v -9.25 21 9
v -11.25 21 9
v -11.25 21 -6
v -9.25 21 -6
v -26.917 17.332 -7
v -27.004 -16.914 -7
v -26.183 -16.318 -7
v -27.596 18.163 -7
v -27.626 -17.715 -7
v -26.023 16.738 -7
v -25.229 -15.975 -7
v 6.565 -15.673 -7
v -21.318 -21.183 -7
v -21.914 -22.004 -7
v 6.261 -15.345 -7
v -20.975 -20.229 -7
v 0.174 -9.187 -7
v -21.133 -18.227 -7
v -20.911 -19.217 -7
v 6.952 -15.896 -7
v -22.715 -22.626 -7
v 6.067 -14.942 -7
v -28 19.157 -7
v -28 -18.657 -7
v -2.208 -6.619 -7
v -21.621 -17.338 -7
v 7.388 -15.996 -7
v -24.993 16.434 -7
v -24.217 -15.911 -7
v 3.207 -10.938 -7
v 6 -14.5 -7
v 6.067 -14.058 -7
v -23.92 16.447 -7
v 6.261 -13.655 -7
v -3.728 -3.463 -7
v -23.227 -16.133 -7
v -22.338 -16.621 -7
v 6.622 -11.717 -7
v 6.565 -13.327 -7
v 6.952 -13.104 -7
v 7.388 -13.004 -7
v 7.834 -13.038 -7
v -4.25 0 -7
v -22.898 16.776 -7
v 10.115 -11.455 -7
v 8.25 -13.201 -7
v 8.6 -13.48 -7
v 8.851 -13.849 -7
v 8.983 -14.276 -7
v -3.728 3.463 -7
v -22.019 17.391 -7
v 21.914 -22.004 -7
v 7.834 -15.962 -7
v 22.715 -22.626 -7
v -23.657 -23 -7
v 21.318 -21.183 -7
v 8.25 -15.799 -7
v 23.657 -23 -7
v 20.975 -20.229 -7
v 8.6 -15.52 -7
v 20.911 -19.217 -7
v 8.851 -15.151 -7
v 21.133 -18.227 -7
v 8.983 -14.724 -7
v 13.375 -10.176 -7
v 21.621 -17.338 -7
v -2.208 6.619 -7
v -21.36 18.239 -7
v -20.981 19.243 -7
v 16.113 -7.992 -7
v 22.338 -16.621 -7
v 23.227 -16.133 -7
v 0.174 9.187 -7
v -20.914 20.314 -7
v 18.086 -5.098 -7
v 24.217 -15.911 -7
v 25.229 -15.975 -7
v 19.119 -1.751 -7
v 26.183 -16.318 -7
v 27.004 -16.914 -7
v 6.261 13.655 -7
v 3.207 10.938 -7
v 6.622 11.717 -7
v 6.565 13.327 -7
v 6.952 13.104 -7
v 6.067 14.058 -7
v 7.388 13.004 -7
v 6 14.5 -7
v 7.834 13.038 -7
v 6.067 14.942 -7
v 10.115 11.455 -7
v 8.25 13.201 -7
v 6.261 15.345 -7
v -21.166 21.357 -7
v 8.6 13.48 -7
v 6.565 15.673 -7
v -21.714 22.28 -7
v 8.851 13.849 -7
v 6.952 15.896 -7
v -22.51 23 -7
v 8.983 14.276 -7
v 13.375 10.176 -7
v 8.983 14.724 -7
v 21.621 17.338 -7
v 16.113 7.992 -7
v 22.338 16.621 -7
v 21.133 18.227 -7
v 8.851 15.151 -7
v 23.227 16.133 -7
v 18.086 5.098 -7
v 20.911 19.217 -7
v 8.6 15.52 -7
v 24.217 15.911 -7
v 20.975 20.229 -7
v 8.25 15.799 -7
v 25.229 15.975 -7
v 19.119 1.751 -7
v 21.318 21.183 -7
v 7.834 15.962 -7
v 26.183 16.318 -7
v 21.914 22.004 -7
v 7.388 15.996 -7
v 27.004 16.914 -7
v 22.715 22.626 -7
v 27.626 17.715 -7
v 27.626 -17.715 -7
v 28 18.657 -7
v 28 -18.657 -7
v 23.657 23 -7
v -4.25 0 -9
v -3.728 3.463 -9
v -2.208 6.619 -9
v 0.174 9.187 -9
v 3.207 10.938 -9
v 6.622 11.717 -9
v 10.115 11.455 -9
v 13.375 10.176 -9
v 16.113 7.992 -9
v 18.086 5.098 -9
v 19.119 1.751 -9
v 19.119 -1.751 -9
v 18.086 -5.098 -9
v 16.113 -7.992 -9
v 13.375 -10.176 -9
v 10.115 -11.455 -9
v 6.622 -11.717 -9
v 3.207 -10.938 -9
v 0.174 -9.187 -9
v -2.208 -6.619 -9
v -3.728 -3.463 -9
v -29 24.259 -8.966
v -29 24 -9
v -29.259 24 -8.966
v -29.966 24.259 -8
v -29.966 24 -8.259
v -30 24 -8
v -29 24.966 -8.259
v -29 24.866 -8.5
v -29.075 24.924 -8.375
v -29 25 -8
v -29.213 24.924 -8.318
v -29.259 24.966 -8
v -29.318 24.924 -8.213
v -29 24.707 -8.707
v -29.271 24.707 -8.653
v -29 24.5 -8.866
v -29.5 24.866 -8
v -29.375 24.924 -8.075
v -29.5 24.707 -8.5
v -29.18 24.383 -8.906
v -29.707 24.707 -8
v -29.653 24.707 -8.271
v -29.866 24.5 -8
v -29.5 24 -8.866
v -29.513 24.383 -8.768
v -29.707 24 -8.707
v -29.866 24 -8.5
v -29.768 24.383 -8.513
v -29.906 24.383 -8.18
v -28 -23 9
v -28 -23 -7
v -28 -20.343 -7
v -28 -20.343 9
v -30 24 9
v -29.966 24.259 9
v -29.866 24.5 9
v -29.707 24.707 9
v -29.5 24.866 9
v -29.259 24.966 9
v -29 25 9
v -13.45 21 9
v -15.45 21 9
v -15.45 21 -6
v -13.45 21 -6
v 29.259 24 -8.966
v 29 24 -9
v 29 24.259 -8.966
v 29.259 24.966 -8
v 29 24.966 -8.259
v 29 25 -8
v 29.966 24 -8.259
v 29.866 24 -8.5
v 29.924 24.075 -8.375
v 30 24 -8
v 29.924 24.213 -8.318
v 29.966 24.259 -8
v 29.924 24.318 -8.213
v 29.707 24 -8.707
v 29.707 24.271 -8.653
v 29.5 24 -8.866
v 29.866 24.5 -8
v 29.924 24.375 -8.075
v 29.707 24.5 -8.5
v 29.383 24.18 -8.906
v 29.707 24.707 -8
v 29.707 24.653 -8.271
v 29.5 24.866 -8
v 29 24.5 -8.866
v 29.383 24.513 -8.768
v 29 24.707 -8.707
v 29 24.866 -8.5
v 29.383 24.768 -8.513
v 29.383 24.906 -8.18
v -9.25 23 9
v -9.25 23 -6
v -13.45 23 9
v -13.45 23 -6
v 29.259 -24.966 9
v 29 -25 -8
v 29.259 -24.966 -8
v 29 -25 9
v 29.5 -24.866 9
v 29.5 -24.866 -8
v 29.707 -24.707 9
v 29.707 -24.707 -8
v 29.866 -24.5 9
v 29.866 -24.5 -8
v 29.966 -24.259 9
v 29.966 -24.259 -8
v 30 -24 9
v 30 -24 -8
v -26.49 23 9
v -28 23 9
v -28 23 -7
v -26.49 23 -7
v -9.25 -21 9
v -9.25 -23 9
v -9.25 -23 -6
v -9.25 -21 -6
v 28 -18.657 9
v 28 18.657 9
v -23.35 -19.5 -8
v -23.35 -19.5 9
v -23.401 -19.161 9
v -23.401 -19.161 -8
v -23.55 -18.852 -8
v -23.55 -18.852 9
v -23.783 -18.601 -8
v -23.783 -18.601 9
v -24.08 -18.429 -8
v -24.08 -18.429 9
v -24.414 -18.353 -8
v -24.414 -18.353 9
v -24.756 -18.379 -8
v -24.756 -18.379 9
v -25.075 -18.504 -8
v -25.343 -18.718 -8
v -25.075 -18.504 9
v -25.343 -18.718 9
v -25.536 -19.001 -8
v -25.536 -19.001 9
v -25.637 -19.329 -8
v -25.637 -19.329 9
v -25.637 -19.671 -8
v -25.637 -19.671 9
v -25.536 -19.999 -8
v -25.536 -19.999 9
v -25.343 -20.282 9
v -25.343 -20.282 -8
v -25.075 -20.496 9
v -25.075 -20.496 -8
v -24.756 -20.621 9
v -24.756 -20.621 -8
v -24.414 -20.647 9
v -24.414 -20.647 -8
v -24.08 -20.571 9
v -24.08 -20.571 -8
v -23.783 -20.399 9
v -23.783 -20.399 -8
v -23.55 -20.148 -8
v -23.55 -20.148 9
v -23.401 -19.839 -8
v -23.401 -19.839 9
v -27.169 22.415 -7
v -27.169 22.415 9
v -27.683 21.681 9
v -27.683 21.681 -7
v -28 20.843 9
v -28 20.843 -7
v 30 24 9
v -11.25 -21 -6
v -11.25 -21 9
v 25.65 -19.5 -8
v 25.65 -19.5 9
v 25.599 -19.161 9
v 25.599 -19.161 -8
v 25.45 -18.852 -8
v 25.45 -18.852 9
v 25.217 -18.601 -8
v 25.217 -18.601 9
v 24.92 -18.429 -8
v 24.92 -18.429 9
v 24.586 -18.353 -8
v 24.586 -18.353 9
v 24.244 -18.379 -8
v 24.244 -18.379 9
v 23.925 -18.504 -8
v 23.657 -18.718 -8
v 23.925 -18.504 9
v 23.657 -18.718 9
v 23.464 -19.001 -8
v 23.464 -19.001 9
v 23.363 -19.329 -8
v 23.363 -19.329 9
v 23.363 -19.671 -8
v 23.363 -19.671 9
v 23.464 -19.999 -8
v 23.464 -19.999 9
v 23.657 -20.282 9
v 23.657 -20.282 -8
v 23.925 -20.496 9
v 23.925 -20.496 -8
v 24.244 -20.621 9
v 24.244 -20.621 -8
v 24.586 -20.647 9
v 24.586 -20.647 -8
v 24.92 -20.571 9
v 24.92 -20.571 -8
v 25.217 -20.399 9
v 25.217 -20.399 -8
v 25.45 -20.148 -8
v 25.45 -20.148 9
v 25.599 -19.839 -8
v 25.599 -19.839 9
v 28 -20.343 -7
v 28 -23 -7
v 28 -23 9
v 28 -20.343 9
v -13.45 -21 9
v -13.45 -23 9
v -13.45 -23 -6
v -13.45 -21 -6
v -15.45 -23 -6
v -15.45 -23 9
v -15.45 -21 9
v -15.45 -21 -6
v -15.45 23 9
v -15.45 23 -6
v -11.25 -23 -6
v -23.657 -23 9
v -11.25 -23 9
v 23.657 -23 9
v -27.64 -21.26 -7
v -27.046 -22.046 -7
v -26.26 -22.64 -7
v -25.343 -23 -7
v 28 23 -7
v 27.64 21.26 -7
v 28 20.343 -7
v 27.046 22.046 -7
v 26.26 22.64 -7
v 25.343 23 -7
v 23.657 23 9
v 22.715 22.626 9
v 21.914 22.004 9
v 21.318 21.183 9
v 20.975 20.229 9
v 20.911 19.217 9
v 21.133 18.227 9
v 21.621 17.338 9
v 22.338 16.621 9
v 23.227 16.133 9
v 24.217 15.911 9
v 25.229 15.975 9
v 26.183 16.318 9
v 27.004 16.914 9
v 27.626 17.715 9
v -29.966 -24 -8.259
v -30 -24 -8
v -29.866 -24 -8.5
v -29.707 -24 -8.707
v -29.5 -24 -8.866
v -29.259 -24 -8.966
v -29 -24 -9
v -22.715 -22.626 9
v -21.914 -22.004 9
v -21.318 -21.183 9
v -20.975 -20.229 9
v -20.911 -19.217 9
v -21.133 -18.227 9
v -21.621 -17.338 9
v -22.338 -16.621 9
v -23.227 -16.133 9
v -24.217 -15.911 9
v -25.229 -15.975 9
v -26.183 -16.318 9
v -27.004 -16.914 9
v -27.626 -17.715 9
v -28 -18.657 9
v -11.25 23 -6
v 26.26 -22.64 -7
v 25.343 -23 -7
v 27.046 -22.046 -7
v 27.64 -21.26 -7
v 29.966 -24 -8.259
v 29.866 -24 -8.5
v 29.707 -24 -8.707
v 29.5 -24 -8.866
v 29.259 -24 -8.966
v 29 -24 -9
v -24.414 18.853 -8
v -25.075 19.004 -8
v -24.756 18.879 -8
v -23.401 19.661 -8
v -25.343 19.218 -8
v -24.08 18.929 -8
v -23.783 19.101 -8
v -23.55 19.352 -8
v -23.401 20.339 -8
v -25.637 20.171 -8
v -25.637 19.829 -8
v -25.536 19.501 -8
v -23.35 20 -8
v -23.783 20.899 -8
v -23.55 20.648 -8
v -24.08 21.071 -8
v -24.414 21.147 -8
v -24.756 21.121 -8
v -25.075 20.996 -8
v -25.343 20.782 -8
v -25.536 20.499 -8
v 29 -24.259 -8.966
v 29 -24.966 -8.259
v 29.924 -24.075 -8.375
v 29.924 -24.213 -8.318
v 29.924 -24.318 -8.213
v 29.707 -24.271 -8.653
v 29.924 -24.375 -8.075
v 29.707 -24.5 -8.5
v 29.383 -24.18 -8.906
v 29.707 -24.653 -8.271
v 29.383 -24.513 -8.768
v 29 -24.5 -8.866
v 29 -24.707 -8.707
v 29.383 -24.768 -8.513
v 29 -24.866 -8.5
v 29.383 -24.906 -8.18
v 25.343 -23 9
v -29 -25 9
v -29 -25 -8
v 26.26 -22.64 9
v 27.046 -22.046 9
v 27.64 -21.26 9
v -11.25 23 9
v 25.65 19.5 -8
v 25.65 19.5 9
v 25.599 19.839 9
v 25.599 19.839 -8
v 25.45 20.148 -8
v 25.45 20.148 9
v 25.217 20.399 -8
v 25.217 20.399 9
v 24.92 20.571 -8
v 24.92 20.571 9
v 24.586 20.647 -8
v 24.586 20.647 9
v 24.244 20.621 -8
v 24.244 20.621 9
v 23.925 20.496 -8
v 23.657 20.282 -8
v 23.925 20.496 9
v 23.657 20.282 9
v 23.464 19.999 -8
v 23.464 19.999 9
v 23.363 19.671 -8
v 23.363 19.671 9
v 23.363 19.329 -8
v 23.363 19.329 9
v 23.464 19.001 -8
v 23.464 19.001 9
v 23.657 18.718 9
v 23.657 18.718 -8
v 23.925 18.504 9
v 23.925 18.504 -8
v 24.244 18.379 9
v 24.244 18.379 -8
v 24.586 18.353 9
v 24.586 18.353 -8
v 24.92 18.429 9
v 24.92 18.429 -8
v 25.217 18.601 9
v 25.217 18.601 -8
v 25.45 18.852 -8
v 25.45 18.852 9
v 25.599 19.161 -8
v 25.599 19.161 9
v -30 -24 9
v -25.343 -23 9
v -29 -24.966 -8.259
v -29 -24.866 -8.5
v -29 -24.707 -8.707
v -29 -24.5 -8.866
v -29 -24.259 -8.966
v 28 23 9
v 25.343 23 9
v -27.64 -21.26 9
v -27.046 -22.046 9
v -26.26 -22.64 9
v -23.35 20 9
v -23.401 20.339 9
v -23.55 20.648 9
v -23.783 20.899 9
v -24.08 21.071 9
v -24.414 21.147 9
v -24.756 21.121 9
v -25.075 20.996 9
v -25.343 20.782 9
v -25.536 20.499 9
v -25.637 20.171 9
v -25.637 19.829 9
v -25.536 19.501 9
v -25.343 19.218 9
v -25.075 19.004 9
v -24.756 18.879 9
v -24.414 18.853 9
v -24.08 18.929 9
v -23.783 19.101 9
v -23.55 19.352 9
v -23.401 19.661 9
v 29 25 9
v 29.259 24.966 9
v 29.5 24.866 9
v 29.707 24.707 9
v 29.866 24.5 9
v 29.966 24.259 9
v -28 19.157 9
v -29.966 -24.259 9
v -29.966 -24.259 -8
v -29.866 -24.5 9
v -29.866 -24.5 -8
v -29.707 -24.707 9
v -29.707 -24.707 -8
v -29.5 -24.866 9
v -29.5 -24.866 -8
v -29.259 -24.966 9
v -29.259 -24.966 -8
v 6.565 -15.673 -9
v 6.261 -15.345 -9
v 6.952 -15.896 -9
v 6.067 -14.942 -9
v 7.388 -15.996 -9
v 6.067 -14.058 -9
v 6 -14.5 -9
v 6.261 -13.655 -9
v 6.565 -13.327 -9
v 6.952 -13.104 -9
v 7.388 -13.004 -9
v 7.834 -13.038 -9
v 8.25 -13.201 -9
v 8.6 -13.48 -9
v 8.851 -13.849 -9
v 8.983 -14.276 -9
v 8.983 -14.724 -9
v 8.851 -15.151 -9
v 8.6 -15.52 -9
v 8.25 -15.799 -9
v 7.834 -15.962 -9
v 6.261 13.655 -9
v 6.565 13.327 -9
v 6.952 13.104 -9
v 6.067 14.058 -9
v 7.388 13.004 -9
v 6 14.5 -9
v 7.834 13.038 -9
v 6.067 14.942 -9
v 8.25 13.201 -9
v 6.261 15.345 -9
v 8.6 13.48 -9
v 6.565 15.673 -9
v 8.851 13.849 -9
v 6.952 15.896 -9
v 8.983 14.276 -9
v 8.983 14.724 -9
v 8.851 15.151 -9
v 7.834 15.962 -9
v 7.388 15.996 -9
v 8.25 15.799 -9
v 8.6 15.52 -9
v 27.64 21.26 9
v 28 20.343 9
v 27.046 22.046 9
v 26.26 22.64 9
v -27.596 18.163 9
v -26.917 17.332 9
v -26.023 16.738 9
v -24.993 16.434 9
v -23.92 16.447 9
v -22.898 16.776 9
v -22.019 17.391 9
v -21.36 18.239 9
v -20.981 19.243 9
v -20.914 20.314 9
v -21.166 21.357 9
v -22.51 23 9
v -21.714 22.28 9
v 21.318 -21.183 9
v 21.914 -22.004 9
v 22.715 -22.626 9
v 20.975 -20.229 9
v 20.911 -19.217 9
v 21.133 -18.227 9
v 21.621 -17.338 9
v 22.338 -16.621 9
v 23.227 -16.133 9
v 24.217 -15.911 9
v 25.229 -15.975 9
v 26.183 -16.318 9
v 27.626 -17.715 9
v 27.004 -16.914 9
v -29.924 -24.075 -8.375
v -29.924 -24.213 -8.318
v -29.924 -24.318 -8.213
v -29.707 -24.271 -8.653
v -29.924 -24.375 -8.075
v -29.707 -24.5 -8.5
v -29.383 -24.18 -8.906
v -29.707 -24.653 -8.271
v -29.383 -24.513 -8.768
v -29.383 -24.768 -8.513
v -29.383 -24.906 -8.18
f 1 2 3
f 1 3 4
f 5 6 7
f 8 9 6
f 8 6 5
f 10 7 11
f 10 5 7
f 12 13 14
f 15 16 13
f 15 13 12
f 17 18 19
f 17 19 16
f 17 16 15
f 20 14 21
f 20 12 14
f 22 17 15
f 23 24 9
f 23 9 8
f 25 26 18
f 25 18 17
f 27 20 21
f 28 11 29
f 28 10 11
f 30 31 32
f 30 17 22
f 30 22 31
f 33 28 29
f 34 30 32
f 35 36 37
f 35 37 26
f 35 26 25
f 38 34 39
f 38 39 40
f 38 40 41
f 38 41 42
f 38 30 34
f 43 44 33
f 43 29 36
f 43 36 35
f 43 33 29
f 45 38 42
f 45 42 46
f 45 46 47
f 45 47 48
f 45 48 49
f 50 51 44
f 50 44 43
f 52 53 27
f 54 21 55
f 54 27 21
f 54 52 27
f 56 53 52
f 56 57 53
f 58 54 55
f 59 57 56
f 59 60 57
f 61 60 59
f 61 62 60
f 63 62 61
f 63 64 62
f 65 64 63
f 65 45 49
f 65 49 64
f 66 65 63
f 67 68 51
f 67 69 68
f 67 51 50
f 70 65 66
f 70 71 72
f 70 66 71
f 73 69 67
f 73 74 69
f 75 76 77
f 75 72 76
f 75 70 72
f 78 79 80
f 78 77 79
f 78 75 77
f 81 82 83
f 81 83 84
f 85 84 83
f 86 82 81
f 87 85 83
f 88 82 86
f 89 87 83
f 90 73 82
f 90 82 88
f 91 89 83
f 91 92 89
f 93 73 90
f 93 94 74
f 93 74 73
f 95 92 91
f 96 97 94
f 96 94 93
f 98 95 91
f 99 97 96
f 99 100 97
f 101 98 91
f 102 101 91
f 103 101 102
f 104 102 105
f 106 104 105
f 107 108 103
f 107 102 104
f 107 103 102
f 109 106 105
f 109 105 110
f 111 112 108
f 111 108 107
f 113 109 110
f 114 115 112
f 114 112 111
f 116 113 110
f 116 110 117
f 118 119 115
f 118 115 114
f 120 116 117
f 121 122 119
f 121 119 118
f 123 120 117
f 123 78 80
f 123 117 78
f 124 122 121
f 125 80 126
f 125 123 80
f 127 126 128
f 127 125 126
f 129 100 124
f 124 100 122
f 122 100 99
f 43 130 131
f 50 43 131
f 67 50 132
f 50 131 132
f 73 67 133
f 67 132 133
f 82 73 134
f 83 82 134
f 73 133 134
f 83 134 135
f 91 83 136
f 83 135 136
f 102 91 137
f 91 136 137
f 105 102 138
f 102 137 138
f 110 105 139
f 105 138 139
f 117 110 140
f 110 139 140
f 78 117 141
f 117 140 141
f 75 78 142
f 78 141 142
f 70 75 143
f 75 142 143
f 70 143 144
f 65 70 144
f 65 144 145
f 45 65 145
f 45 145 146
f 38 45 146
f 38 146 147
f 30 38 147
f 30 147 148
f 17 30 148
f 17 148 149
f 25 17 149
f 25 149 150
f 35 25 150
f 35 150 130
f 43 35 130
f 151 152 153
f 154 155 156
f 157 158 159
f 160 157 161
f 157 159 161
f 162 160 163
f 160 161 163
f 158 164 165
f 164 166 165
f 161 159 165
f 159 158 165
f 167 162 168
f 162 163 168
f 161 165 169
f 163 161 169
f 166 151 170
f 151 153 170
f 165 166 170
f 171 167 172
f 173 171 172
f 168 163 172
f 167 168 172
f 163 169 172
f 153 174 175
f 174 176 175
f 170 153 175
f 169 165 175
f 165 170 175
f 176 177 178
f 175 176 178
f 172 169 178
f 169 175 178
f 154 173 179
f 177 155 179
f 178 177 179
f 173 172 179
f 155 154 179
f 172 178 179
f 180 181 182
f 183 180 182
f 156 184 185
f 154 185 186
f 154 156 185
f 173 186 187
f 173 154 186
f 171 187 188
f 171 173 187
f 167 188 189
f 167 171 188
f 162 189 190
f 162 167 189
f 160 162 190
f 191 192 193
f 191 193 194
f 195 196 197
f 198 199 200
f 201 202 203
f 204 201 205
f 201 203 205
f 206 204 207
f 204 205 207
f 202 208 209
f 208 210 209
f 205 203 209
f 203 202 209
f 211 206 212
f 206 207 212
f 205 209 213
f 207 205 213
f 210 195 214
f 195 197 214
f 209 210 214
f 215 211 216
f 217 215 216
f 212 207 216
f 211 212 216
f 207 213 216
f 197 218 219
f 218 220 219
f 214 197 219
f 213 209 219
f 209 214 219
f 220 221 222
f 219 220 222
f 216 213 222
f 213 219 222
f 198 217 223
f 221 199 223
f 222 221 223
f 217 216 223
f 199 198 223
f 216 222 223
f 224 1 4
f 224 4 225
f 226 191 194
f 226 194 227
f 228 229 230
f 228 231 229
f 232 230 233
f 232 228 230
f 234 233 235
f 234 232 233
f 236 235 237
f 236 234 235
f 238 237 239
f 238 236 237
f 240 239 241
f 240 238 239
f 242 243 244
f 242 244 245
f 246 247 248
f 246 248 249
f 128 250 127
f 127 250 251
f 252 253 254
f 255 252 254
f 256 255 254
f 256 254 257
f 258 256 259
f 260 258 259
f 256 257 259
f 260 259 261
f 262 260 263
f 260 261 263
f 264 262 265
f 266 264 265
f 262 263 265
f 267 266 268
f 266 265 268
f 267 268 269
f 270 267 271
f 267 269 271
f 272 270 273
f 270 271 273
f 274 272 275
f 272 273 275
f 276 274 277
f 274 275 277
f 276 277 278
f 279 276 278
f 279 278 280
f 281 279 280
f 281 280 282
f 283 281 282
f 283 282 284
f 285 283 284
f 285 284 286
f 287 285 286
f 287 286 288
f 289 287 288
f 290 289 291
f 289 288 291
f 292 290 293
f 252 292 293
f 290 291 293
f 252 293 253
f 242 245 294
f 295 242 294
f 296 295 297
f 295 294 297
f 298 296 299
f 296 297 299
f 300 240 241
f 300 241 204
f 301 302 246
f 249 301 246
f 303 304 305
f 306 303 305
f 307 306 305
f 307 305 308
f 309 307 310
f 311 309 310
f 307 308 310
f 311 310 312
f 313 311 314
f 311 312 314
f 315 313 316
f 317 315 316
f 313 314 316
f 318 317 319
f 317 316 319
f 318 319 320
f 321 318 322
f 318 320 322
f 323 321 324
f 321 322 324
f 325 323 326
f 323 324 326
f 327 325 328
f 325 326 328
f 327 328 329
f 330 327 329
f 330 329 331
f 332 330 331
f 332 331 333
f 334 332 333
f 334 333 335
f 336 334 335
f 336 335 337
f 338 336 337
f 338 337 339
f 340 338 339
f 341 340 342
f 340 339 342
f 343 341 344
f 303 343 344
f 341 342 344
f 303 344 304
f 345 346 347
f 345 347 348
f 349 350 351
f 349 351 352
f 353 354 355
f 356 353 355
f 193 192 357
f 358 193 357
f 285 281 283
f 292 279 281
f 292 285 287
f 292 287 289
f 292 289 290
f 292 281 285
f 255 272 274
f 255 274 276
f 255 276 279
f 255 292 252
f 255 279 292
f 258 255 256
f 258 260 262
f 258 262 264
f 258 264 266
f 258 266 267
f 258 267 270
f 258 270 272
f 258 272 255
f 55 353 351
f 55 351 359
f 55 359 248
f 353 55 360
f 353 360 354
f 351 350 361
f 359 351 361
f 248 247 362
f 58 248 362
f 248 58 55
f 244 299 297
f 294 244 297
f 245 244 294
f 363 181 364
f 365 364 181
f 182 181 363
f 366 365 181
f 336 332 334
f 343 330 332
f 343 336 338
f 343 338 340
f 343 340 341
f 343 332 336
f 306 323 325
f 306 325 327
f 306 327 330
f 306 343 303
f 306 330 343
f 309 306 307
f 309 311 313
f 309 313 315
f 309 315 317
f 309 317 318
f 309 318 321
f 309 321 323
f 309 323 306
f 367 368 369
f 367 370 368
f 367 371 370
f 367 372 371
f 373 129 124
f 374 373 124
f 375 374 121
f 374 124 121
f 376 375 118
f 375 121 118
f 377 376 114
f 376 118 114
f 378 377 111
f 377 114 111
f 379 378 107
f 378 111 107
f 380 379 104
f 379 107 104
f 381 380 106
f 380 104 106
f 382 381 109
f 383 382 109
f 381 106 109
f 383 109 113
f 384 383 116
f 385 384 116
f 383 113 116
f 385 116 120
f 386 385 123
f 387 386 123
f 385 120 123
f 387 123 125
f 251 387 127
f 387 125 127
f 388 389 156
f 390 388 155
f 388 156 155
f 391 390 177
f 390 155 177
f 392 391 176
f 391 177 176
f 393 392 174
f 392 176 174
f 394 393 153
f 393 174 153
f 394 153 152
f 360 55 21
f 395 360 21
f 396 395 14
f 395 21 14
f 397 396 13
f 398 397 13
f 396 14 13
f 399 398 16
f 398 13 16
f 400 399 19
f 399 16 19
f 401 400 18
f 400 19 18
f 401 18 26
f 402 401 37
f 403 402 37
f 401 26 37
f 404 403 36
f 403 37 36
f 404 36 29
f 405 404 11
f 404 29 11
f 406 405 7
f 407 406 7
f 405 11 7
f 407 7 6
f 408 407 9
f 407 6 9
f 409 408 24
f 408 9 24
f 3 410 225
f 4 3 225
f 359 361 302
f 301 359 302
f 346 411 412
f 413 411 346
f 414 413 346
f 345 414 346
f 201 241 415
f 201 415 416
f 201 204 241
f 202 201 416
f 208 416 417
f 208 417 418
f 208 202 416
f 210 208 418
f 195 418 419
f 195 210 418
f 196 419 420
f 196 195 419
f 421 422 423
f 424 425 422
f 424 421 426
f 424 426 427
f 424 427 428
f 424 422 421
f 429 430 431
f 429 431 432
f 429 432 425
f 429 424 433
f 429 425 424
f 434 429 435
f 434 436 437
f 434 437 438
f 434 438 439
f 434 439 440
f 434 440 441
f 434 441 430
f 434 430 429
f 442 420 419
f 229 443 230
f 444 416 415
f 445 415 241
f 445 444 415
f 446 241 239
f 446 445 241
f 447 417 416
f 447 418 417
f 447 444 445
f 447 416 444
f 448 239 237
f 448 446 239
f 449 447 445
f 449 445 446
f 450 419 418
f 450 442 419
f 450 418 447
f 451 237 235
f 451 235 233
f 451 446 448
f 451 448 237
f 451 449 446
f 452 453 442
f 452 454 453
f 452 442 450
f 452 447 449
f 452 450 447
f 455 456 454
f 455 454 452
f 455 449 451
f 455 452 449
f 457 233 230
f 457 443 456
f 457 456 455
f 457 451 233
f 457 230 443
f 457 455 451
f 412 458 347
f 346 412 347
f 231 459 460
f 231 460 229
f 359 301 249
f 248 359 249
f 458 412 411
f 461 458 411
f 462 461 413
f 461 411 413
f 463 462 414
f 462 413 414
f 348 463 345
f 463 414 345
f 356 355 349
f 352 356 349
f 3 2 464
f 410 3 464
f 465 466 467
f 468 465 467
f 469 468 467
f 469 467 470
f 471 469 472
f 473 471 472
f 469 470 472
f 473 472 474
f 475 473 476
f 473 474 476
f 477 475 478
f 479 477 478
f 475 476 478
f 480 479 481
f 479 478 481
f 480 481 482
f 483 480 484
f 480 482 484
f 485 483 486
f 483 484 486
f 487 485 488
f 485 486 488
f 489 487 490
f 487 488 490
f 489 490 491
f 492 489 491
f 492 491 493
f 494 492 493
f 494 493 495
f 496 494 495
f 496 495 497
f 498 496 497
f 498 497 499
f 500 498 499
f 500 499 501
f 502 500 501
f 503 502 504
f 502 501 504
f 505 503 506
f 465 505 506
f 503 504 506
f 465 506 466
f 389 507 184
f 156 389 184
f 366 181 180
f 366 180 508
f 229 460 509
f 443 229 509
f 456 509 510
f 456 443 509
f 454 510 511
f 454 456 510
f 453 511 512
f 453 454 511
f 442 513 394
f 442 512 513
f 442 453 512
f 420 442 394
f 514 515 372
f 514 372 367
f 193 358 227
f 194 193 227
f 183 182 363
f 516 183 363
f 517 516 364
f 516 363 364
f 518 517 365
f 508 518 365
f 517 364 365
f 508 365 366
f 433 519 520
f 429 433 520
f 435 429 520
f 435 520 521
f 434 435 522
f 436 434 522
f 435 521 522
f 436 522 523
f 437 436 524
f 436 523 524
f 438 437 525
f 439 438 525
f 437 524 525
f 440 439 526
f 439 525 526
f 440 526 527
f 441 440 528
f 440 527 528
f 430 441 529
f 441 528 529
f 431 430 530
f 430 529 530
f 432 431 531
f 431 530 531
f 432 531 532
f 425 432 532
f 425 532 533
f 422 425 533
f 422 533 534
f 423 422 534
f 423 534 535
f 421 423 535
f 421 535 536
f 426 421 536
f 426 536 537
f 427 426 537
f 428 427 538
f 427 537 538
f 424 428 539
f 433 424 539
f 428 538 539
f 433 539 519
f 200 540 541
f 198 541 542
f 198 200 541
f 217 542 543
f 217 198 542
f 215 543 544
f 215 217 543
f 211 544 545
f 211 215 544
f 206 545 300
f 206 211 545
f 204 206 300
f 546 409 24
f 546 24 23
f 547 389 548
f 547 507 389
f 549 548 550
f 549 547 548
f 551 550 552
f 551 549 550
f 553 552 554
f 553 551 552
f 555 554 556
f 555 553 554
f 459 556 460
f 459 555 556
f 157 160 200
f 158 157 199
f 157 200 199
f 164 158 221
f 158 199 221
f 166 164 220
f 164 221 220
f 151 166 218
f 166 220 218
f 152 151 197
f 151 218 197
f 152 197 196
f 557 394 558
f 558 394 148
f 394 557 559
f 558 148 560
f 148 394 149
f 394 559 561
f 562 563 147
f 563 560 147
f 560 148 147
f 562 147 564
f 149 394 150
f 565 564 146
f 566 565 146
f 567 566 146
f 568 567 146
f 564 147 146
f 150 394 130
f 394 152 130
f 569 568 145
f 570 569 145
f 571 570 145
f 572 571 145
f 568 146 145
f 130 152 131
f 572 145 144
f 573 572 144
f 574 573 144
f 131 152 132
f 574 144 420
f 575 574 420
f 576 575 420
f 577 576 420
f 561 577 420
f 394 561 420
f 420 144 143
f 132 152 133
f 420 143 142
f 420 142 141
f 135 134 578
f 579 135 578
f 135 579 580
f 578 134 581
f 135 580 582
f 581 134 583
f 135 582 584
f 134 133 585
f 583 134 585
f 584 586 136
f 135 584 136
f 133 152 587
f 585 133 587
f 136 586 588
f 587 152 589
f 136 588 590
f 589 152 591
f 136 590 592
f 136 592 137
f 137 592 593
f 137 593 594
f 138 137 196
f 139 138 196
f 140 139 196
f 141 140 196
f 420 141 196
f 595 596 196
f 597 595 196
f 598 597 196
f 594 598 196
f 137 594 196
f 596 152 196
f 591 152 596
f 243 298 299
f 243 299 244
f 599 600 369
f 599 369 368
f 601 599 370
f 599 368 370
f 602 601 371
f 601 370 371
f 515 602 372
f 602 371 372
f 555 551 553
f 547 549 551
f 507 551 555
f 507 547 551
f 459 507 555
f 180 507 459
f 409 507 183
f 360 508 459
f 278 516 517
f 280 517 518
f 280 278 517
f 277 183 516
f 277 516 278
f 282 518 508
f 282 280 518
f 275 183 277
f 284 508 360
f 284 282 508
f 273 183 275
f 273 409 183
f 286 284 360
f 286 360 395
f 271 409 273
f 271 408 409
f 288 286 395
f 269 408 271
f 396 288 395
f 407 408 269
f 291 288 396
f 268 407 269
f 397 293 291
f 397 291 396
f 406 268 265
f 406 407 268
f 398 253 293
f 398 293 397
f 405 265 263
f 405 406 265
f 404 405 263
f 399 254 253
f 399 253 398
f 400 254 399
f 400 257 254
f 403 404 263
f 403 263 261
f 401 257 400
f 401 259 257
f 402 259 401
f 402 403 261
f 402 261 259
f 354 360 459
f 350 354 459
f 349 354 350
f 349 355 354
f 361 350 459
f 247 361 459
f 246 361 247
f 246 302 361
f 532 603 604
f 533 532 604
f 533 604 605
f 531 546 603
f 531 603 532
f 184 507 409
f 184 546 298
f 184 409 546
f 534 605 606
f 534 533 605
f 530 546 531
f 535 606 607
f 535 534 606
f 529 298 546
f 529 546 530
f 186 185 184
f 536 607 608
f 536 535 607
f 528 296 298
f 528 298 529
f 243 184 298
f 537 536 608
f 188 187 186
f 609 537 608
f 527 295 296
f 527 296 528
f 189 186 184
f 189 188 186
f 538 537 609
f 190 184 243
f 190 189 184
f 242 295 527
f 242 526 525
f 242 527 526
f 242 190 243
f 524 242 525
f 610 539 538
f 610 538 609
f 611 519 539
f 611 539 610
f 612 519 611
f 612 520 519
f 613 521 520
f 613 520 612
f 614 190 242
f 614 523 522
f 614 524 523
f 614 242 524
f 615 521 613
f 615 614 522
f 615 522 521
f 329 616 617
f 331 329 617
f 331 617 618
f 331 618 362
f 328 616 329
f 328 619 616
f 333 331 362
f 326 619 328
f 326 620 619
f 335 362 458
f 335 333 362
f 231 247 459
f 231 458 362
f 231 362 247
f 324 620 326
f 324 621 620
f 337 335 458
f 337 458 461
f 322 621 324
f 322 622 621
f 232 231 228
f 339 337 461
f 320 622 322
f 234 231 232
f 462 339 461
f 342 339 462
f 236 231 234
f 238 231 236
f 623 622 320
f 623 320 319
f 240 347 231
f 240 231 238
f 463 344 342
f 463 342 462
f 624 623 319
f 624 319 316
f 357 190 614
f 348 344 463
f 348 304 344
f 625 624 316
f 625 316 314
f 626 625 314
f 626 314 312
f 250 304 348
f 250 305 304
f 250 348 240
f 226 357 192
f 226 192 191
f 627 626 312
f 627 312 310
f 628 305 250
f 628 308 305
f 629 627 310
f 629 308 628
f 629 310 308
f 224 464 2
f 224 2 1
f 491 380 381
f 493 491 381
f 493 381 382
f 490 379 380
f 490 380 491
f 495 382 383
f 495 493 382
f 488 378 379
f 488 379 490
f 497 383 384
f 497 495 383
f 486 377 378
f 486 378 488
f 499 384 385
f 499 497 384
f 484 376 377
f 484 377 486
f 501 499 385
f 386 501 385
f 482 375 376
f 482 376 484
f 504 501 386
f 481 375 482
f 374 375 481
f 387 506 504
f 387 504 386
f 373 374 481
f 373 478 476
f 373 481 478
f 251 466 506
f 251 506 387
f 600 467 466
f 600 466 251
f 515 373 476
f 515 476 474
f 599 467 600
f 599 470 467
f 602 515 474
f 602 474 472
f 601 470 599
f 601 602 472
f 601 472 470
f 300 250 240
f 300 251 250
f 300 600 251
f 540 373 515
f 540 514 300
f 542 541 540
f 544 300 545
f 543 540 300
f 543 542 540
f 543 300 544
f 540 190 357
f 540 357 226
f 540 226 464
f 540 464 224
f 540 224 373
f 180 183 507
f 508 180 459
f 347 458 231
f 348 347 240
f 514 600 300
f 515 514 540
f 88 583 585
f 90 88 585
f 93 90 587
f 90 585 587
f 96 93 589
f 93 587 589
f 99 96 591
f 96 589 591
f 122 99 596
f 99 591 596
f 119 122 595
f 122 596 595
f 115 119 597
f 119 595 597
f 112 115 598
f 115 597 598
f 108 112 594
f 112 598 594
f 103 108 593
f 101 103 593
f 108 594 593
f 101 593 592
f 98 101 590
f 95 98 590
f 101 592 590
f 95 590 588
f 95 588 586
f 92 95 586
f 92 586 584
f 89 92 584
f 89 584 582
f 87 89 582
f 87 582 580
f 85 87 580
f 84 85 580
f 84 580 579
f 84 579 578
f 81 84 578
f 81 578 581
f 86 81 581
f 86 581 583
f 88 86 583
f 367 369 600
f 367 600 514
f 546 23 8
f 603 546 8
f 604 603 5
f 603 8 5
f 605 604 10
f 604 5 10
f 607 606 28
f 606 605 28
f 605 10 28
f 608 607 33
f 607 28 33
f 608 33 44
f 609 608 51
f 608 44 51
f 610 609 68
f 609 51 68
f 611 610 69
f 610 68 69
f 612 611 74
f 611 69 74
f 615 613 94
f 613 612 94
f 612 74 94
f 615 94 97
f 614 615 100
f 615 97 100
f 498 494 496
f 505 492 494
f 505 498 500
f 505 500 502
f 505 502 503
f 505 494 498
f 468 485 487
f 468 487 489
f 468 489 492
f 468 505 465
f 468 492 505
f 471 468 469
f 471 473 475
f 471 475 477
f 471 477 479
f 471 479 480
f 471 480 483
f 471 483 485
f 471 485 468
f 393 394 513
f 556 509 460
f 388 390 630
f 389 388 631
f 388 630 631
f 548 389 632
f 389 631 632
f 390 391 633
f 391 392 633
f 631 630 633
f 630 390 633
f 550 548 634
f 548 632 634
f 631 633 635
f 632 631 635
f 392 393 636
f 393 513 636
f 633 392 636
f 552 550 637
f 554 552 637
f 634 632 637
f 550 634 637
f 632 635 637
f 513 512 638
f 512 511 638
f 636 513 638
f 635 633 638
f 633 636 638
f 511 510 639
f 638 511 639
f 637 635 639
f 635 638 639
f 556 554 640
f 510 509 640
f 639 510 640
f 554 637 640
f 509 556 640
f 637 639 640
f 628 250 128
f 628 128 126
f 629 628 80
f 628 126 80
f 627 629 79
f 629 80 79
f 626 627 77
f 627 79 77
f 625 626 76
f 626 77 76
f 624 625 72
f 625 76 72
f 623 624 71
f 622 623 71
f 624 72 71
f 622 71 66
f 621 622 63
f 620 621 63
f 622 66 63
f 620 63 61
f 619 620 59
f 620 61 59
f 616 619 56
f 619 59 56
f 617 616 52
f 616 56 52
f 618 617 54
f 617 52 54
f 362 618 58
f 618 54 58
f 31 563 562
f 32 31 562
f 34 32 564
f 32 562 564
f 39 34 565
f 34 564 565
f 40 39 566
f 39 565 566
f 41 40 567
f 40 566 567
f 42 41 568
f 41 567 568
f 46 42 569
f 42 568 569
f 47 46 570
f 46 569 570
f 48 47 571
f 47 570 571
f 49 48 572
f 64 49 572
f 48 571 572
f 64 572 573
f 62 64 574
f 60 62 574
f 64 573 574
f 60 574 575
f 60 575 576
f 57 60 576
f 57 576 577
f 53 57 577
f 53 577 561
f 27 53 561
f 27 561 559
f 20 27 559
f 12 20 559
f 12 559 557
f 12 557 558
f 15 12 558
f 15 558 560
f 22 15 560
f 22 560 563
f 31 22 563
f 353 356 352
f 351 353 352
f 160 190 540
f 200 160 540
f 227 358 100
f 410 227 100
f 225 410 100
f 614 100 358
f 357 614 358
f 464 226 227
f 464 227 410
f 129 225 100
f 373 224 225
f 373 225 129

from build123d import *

# Parameters (mm, degrees)
SKETCH2_W            = 60
SKETCH2_H            = 50
BOSS_EXTRUDE1_DEPTH  = 9
SHELL1_T             = -2
SKETCH6_R            = 11.75
SKETCH6_R_2          = 1.5
CUT_EXTRUDE3_DEPTH   = 18
SKETCH8_R            = 3.6
BOSS_EXTRUDE7_DEPTH  = 16
SKETCH10_R           = 3.6
BOSS_EXTRUDE8_DEPTH  = 16
SKETCH11_R           = 1.15
CUT_EXTRUDE4_DEPTH   = 17
SKETCH12_W           = 2
SKETCH12_H           = 2
BOSS_EXTRUDE13_DEPTH = 15
FILLET3_R            = 1


with BuildPart() as part:
    # Sketch2 → Boss-Extrude1 (new, symmetric)
    with BuildSketch(Plane.XY):
        Rectangle(SKETCH2_W, SKETCH2_H)
    extrude(amount=BOSS_EXTRUDE1_DEPTH, both=True)

    # Shell1
    shell1_openings = [part.faces().sort_by_distance(p)[0] for p in [
        (0, 0, 9),
    ]]
    offset(amount=SHELL1_T, openings=shell1_openings, kind=Kind.INTERSECTION)

    # Sketch6 → Cut-Extrude3 (cut)
    with BuildSketch(Plane(origin=(0, 0, -9), x_dir=(-1, 0, 0), z_dir=(0, 0, -1))):
        with Locations((-7.5, 0)):
            Circle(SKETCH6_R)
        with Locations((-7.5, 14.5)):
            Circle(SKETCH6_R_2)
        with Locations((-7.5, -14.5)):
            Circle(SKETCH6_R_2)
    extrude(amount=-CUT_EXTRUDE3_DEPTH, mode=Mode.SUBTRACT)

    # Sketch8 → Boss-Extrude7 (add, through all)
    with BuildSketch(Plane.XY.offset(-7)):
        with Locations((-24.5, 20)):
            Circle(SKETCH8_R)
    extrude(amount=BOSS_EXTRUDE7_DEPTH)

    # Sketch10 → Boss-Extrude8 (add, through all)
    with BuildSketch(Plane.XY.offset(-7)):
        with Locations((24.5, -19.5)):
            Circle(SKETCH10_R)
        with Locations((24.5, 19.5)):
            Circle(SKETCH10_R)
        with Locations((-24.5, -19.5)):
            Circle(SKETCH10_R)
    extrude(amount=BOSS_EXTRUDE8_DEPTH)

    # Sketch11 → Cut-Extrude4 (cut)
    with BuildSketch(Plane.XY.offset(9)):
        with Locations((-24.5, 20)):
            Circle(SKETCH11_R)
        with Locations((24.5, 19.5)):
            Circle(SKETCH11_R)
        with Locations((24.5, -19.5)):
            Circle(SKETCH11_R)
        with Locations((-24.5, -19.5)):
            Circle(SKETCH11_R)
    extrude(amount=-CUT_EXTRUDE4_DEPTH, mode=Mode.SUBTRACT)

    # Sketch12 → Boss-Extrude13 (add)
    with BuildSketch(Plane.XY.offset(9)):
        with Locations((-10.25, -22)):
            Rectangle(SKETCH12_W, SKETCH12_H)
        with Locations((-14.45, -22)):
            Rectangle(SKETCH12_W, SKETCH12_H)
        with Locations((-14.45, 22)):
            Rectangle(SKETCH12_W, SKETCH12_H)
        with Locations((-10.25, 22)):
            Rectangle(SKETCH12_W, SKETCH12_H)
    extrude(amount=-BOSS_EXTRUDE13_DEPTH)

    # Fillet3
    fillet3_edges = [part.edges().sort_by_distance(p)[0] for p in [
        (0, -25, -9),
        (-30, 0, -9),
        (0, 25, -9),
        (30, 0, -9),
        (30, -25, 0),
        (-30, -25, 0),
        (-30, 25, 0),
        (30, 25, 0),
    ]]
    fillet(fillet3_edges, radius=FILLET3_R)


solid = part.part
